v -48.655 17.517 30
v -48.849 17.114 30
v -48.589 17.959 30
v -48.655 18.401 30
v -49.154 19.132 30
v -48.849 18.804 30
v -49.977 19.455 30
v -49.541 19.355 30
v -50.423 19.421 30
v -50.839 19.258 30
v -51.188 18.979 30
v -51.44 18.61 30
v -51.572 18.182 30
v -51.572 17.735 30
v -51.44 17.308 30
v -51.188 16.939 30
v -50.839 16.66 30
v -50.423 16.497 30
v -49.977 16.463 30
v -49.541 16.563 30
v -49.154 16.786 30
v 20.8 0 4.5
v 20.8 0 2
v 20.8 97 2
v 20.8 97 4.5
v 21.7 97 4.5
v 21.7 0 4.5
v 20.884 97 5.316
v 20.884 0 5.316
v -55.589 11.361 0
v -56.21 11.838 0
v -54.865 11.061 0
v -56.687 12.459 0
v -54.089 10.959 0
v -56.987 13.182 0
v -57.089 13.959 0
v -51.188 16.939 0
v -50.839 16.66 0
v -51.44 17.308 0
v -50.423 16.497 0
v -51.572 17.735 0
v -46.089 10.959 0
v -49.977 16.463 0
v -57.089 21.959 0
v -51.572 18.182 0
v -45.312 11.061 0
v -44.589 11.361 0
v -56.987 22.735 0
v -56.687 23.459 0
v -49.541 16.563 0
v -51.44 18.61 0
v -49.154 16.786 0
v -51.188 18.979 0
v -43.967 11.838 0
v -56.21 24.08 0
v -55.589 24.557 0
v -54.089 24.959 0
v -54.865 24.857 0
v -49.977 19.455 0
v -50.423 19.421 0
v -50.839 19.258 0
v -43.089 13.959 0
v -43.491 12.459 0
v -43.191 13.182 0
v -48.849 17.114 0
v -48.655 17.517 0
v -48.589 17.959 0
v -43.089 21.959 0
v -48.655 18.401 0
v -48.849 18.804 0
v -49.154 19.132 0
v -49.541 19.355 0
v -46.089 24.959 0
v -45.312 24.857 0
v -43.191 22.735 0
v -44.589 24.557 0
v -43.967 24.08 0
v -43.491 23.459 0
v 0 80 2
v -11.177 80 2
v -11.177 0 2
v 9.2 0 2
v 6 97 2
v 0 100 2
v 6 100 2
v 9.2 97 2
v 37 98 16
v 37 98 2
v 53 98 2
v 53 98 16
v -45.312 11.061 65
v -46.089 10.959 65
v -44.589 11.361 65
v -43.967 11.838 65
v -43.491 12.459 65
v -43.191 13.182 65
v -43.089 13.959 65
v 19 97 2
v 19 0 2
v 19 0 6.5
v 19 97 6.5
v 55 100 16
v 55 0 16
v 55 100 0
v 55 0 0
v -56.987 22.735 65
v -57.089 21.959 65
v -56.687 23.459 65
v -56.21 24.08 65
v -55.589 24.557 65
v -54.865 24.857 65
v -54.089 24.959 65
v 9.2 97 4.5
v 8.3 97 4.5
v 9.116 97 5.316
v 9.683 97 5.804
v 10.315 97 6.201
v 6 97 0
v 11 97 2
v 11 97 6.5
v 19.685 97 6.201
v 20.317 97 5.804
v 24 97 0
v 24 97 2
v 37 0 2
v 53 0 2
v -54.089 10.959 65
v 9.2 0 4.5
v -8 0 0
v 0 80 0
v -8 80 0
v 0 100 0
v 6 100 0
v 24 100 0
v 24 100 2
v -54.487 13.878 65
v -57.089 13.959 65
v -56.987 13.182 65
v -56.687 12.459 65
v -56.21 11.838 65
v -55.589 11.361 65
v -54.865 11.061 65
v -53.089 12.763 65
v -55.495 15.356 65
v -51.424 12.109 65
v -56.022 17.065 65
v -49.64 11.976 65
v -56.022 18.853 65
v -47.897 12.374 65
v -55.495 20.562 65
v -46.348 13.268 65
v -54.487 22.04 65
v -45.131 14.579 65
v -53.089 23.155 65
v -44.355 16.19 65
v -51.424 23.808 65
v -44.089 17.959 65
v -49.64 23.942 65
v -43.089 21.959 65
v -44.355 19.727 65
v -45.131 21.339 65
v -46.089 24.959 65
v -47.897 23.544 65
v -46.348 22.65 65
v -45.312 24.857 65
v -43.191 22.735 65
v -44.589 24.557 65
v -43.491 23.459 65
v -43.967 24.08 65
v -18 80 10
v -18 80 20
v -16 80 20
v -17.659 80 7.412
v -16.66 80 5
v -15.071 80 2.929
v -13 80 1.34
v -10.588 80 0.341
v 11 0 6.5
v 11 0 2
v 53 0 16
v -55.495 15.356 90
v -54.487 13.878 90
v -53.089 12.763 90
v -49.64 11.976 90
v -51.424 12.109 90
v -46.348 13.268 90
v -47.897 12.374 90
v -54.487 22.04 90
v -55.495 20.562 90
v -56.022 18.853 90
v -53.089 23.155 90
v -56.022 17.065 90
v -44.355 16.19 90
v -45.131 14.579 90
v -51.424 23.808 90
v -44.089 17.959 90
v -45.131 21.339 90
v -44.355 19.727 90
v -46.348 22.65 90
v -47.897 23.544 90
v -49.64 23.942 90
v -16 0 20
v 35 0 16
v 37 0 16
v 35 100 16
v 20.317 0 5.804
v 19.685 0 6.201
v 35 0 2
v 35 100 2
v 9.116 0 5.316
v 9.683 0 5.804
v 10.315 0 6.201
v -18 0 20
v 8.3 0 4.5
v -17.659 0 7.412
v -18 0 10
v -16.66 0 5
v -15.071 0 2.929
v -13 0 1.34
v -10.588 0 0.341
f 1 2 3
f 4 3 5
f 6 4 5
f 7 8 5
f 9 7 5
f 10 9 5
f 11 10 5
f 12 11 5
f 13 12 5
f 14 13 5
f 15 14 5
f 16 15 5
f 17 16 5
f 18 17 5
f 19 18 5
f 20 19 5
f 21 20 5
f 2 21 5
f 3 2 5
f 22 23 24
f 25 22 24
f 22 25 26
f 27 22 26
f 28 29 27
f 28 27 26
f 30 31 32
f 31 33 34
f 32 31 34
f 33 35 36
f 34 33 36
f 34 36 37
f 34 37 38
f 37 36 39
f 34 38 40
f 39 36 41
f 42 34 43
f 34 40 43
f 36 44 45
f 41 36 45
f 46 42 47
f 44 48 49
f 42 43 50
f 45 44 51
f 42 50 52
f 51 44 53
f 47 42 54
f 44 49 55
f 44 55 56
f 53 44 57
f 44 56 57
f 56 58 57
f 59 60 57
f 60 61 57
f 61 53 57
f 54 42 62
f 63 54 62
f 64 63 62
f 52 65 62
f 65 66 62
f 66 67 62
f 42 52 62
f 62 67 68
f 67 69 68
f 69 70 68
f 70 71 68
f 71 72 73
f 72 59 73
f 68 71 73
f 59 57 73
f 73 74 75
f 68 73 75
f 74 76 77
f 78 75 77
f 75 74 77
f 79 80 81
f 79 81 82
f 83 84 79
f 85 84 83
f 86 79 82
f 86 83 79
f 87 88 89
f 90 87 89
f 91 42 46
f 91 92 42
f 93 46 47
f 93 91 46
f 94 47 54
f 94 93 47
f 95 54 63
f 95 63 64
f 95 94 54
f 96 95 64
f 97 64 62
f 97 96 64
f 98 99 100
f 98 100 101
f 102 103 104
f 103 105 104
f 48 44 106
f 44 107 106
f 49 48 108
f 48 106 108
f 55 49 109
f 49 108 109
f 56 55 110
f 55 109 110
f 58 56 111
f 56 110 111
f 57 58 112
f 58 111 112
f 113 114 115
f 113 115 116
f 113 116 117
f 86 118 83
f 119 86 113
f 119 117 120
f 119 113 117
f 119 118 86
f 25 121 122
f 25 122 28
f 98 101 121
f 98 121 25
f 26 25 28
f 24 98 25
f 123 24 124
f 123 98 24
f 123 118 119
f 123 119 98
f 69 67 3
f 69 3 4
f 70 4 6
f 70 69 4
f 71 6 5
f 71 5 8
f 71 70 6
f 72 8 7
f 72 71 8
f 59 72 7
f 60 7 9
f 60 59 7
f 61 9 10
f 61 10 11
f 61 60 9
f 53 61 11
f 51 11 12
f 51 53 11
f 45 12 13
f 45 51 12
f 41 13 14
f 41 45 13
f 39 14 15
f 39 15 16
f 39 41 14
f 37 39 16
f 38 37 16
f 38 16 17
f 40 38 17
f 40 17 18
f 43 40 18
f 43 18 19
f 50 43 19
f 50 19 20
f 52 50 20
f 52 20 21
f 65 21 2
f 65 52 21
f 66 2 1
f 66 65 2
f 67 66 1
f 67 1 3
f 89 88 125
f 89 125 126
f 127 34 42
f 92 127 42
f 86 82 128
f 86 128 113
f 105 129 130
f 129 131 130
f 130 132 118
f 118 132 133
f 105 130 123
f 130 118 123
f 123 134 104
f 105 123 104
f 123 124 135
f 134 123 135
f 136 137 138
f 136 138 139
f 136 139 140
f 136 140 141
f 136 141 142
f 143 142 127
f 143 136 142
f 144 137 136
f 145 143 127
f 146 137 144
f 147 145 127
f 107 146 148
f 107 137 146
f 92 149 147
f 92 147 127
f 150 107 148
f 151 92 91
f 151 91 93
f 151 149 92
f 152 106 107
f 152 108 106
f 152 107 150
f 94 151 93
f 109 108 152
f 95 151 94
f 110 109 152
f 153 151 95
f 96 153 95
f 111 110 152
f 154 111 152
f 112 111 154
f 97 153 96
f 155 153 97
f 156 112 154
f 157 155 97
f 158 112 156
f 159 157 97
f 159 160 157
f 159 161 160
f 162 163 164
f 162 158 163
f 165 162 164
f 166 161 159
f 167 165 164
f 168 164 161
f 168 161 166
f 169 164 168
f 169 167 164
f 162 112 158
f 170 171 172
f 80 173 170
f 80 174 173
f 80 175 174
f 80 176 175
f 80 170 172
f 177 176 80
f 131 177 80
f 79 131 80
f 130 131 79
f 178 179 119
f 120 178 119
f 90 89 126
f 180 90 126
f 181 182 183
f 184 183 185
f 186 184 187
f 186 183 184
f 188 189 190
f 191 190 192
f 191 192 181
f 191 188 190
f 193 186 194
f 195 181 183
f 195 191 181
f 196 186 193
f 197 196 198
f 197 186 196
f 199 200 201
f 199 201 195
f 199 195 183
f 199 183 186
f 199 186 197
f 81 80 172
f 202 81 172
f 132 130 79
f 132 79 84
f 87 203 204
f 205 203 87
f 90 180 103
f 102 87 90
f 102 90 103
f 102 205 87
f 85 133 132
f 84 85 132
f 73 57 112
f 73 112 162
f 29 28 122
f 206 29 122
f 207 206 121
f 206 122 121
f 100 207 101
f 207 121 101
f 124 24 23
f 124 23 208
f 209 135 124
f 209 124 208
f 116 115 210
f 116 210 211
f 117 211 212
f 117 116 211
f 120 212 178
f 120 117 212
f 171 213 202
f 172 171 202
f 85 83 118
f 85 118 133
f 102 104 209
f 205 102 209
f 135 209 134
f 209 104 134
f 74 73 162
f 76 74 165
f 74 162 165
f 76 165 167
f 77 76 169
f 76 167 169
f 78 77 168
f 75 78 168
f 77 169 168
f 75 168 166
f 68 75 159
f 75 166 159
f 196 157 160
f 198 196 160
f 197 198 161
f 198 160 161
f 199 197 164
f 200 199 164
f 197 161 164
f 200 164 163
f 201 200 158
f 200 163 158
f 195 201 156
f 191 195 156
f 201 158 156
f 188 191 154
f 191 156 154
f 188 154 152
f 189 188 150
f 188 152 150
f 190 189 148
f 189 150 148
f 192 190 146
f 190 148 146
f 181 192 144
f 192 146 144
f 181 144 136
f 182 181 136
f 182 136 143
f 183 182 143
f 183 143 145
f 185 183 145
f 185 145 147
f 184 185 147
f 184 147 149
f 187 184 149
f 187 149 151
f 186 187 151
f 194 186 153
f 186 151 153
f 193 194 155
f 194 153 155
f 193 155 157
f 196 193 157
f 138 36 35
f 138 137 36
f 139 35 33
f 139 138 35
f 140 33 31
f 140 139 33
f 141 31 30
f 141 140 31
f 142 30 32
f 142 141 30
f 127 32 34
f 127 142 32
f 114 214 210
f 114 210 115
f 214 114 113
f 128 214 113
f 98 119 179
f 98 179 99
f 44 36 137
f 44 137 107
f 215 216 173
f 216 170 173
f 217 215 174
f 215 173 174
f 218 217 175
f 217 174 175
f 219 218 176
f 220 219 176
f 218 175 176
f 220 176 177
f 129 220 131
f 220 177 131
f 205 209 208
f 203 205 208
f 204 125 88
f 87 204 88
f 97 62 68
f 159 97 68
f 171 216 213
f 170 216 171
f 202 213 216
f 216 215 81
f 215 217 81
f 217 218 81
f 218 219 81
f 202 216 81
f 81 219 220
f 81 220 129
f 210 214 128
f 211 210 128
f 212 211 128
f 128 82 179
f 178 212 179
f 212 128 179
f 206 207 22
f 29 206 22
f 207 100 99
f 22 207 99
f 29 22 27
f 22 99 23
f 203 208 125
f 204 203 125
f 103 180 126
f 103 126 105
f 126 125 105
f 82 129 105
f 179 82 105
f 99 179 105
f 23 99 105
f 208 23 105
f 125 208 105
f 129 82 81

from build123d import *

# Parameters (mm, degrees)
F0_W           = 55
F0_H           = 100
F1_DEPTH       = 2
F2_W           = 16
F2_H           = 2
F3_DEPTH       = 14
F4_W           = 1.8
F4_H           = 100
F5_DEPTH       = 2.5
F7_W           = 1.8
F7_H           = 100
F7_W_2         = 0.9
F6_W           = 1.8
F6_H           = 100
F6_W_2         = 0.9
F8_DEPTH       = 2
F9_SIZE        = 1.99999
F10_T1_DEPTH   = 108.3703792641
F11_W          = 5
F11_H          = 3
F11_W_2        = 8
F12_DEPTH      = 2.001
F12_DEPTH_BACK = 10
F13_W          = 14
F13_H          = 14
F15_DEPTH      = 65
F16_R          = 6
F17_DEPTH      = 25
F18_R          = 3
F19_R          = 1.5
F20_DEPTH      = 30
F21_W          = 18
F21_H          = 80
F22_DEPTH      = 20
F23_T4_DEPTH   = 390.1150986591
F24_R          = 10


# Not quite as in the source:
# - a fillet or chamfer that OpenCascade refuses, or shapes differently, is made with other operations: its cross-section is extruded or revolved along the edge and cut away or added
# - a fillet or chamfer is up to 0.001 mm smaller than in the source, because OpenCascade refuses the exact size


with BuildPart() as f1:
    # F0 (on Top) → F1 (new body)
    with BuildSketch(Plane.XY):
        with Locations((27.5, 50)):
            Rectangle(F0_W, F0_H)
    extrude(amount=F1_DEPTH)

    # F2 (on face) → F3 (join)
    with BuildSketch(Plane.XY.offset(2)):
        Polygon((37, 98), (37, 100), (35, 100), (35, 0), (37, 0), align=None)
        Polygon((55, 0), (55, 100), (53, 100), (53, 98), (53, 0), align=None)
        with Locations((45, 99)):
            Rectangle(F2_W, F2_H)
    extrude(amount=F3_DEPTH)

    # F4 (on face) → F5 (join)
    with BuildSketch(Plane.XY.offset(2)):
        with Locations((10.1, 50)):
            Rectangle(F4_W, F4_H)
        with Locations((19.9, 50)):
            Rectangle(F4_W, F4_H)
    extrude(amount=F5_DEPTH)

    # F7 (on face) + F6 (on face) → F8 (join)
    with BuildSketch(Plane.XY.offset(4.5)):
        with Locations((19.9, 50)):
            Rectangle(F7_W, F7_H)
        with Locations((21.25, 50)):
            Rectangle(F7_W_2, F7_H)
    with BuildSketch(Plane.XY.offset(4.5)):
        with Locations((10.1, 50)):
            Rectangle(F6_W, F6_H)
        with Locations((8.75, 50)):
            Rectangle(F6_W_2, F6_H)
    extrude(amount=F8_DEPTH)

    # F9 (size 2 in the source; OpenCascade refuses exactly that, so slightly less here)
    f9_edges = [f1.edges().sort_by_distance(p)[0] for p in [
        (8.3, 50, 6.5),
        (21.7, 50, 6.5),
    ]]
    chamfer(f9_edges, length=F9_SIZE)

    # F10: fillet of radius 5 on 2 edges, made by hand

    # F10_s2 → F10_t1 (cut)
    with BuildSketch(Plane.XZ.offset(-104.1851896321)):
        with BuildLine():
            ThreePointArc((9.1162396122, 5.3162496122), (9.9914434967, 6.0142301065), (11, 6.5))
            Line((11, 6.5), (10.29999, 6.5))
            Line((10.29999, 6.5), (9.1162396122, 5.3162496122))
        make_face()
        with BuildLine():
            ThreePointArc((20.8837603878, 5.3162496122), (20.0085565033, 6.0142301065), (19, 6.5))
            Line((19, 6.5), (19.70001, 6.5))
            Line((19.70001, 6.5), (20.8837603878, 5.3162496122))
        make_face()
    extrude(amount=F10_T1_DEPTH, mode=Mode.SUBTRACT)

    # F11 (on face) → F12 (cut, two sides)
    with BuildSketch(Plane.XY.offset(2)) as f12_sk:
        with Locations((8.5, 98.5)):
            Rectangle(F11_W, F11_H)
        with Locations((15, 98.5)):
            Rectangle(F11_W_2, F11_H)
        with Locations((21.5, 98.5)):
            Rectangle(F11_W, F11_H)
    extrude(amount=-F12_DEPTH, mode=Mode.SUBTRACT)
    extrude(f12_sk.sketch, amount=F12_DEPTH_BACK, mode=Mode.SUBTRACT)

    # F21 (on Top) → F22 (join)
    with BuildSketch(Plane.XY):
        with Locations((-9, 40)):
            Rectangle(F21_W, F21_H)
    extrude(amount=F22_DEPTH)

    # F23: chamfer of 16 x 59.7128129211 on 1 edges, made by hand


with BuildPart() as f15:
    # F13 (on Top) → F15 (new body)
    with BuildSketch(Plane.XY):
        with Locations((-50.0888161063, 17.9589258209)):
            Rectangle(F13_W, F13_H)
    extrude(amount=F15_DEPTH)

    # F16 (on face) → F17 (join)
    with BuildSketch(Plane.XY.offset(65)):
        with Locations((-50.0888161063, 17.9589258209)):
            Circle(F16_R)
    extrude(amount=F17_DEPTH)

    # F18
    f18_edges = [f15.edges().sort_by_distance(p)[0] for p in [
        (-57.088816, 10.958926, 32.5),
        (-43.088816, 10.958926, 32.5),
        (-43.088816, 24.958926, 32.5),
        (-57.088816, 24.958926, 32.5),
    ]]
    fillet(f18_edges, radius=F18_R)

    # F19 (on face) → F20 (cut)
    with BuildSketch(Plane.XY):
        with Locations((-50.0888161063, 17.9589258209)):
            Circle(F19_R)
    extrude(amount=F20_DEPTH, mode=Mode.SUBTRACT)


with BuildPart() as f23_tool2:
    # F23_s3 → F23_t4 (new body)
    with BuildSketch(Plane.XZ.offset(155.0575493296)):
        Polygon((0, -39.7128129211), (-16, 20), (0, 20), align=None)
    extrude(amount=-F23_T4_DEPTH)

    split(bisect_by=Plane.XY.offset(2), keep=Keep.TOP)


with BuildPart() as f1_1:
    add(f1.part)

    # F23_t1: cut F23_tool2
    add(f23_tool2.part, mode=Mode.SUBTRACT)

    # F24
    f24_edges = [f1_1.edges().sort_by_distance(p)[0] for p in [
        (-18, 40, 0),
    ]]
    fillet(f24_edges, radius=F24_R)


solid = Compound([f15.part, f1_1.part])
